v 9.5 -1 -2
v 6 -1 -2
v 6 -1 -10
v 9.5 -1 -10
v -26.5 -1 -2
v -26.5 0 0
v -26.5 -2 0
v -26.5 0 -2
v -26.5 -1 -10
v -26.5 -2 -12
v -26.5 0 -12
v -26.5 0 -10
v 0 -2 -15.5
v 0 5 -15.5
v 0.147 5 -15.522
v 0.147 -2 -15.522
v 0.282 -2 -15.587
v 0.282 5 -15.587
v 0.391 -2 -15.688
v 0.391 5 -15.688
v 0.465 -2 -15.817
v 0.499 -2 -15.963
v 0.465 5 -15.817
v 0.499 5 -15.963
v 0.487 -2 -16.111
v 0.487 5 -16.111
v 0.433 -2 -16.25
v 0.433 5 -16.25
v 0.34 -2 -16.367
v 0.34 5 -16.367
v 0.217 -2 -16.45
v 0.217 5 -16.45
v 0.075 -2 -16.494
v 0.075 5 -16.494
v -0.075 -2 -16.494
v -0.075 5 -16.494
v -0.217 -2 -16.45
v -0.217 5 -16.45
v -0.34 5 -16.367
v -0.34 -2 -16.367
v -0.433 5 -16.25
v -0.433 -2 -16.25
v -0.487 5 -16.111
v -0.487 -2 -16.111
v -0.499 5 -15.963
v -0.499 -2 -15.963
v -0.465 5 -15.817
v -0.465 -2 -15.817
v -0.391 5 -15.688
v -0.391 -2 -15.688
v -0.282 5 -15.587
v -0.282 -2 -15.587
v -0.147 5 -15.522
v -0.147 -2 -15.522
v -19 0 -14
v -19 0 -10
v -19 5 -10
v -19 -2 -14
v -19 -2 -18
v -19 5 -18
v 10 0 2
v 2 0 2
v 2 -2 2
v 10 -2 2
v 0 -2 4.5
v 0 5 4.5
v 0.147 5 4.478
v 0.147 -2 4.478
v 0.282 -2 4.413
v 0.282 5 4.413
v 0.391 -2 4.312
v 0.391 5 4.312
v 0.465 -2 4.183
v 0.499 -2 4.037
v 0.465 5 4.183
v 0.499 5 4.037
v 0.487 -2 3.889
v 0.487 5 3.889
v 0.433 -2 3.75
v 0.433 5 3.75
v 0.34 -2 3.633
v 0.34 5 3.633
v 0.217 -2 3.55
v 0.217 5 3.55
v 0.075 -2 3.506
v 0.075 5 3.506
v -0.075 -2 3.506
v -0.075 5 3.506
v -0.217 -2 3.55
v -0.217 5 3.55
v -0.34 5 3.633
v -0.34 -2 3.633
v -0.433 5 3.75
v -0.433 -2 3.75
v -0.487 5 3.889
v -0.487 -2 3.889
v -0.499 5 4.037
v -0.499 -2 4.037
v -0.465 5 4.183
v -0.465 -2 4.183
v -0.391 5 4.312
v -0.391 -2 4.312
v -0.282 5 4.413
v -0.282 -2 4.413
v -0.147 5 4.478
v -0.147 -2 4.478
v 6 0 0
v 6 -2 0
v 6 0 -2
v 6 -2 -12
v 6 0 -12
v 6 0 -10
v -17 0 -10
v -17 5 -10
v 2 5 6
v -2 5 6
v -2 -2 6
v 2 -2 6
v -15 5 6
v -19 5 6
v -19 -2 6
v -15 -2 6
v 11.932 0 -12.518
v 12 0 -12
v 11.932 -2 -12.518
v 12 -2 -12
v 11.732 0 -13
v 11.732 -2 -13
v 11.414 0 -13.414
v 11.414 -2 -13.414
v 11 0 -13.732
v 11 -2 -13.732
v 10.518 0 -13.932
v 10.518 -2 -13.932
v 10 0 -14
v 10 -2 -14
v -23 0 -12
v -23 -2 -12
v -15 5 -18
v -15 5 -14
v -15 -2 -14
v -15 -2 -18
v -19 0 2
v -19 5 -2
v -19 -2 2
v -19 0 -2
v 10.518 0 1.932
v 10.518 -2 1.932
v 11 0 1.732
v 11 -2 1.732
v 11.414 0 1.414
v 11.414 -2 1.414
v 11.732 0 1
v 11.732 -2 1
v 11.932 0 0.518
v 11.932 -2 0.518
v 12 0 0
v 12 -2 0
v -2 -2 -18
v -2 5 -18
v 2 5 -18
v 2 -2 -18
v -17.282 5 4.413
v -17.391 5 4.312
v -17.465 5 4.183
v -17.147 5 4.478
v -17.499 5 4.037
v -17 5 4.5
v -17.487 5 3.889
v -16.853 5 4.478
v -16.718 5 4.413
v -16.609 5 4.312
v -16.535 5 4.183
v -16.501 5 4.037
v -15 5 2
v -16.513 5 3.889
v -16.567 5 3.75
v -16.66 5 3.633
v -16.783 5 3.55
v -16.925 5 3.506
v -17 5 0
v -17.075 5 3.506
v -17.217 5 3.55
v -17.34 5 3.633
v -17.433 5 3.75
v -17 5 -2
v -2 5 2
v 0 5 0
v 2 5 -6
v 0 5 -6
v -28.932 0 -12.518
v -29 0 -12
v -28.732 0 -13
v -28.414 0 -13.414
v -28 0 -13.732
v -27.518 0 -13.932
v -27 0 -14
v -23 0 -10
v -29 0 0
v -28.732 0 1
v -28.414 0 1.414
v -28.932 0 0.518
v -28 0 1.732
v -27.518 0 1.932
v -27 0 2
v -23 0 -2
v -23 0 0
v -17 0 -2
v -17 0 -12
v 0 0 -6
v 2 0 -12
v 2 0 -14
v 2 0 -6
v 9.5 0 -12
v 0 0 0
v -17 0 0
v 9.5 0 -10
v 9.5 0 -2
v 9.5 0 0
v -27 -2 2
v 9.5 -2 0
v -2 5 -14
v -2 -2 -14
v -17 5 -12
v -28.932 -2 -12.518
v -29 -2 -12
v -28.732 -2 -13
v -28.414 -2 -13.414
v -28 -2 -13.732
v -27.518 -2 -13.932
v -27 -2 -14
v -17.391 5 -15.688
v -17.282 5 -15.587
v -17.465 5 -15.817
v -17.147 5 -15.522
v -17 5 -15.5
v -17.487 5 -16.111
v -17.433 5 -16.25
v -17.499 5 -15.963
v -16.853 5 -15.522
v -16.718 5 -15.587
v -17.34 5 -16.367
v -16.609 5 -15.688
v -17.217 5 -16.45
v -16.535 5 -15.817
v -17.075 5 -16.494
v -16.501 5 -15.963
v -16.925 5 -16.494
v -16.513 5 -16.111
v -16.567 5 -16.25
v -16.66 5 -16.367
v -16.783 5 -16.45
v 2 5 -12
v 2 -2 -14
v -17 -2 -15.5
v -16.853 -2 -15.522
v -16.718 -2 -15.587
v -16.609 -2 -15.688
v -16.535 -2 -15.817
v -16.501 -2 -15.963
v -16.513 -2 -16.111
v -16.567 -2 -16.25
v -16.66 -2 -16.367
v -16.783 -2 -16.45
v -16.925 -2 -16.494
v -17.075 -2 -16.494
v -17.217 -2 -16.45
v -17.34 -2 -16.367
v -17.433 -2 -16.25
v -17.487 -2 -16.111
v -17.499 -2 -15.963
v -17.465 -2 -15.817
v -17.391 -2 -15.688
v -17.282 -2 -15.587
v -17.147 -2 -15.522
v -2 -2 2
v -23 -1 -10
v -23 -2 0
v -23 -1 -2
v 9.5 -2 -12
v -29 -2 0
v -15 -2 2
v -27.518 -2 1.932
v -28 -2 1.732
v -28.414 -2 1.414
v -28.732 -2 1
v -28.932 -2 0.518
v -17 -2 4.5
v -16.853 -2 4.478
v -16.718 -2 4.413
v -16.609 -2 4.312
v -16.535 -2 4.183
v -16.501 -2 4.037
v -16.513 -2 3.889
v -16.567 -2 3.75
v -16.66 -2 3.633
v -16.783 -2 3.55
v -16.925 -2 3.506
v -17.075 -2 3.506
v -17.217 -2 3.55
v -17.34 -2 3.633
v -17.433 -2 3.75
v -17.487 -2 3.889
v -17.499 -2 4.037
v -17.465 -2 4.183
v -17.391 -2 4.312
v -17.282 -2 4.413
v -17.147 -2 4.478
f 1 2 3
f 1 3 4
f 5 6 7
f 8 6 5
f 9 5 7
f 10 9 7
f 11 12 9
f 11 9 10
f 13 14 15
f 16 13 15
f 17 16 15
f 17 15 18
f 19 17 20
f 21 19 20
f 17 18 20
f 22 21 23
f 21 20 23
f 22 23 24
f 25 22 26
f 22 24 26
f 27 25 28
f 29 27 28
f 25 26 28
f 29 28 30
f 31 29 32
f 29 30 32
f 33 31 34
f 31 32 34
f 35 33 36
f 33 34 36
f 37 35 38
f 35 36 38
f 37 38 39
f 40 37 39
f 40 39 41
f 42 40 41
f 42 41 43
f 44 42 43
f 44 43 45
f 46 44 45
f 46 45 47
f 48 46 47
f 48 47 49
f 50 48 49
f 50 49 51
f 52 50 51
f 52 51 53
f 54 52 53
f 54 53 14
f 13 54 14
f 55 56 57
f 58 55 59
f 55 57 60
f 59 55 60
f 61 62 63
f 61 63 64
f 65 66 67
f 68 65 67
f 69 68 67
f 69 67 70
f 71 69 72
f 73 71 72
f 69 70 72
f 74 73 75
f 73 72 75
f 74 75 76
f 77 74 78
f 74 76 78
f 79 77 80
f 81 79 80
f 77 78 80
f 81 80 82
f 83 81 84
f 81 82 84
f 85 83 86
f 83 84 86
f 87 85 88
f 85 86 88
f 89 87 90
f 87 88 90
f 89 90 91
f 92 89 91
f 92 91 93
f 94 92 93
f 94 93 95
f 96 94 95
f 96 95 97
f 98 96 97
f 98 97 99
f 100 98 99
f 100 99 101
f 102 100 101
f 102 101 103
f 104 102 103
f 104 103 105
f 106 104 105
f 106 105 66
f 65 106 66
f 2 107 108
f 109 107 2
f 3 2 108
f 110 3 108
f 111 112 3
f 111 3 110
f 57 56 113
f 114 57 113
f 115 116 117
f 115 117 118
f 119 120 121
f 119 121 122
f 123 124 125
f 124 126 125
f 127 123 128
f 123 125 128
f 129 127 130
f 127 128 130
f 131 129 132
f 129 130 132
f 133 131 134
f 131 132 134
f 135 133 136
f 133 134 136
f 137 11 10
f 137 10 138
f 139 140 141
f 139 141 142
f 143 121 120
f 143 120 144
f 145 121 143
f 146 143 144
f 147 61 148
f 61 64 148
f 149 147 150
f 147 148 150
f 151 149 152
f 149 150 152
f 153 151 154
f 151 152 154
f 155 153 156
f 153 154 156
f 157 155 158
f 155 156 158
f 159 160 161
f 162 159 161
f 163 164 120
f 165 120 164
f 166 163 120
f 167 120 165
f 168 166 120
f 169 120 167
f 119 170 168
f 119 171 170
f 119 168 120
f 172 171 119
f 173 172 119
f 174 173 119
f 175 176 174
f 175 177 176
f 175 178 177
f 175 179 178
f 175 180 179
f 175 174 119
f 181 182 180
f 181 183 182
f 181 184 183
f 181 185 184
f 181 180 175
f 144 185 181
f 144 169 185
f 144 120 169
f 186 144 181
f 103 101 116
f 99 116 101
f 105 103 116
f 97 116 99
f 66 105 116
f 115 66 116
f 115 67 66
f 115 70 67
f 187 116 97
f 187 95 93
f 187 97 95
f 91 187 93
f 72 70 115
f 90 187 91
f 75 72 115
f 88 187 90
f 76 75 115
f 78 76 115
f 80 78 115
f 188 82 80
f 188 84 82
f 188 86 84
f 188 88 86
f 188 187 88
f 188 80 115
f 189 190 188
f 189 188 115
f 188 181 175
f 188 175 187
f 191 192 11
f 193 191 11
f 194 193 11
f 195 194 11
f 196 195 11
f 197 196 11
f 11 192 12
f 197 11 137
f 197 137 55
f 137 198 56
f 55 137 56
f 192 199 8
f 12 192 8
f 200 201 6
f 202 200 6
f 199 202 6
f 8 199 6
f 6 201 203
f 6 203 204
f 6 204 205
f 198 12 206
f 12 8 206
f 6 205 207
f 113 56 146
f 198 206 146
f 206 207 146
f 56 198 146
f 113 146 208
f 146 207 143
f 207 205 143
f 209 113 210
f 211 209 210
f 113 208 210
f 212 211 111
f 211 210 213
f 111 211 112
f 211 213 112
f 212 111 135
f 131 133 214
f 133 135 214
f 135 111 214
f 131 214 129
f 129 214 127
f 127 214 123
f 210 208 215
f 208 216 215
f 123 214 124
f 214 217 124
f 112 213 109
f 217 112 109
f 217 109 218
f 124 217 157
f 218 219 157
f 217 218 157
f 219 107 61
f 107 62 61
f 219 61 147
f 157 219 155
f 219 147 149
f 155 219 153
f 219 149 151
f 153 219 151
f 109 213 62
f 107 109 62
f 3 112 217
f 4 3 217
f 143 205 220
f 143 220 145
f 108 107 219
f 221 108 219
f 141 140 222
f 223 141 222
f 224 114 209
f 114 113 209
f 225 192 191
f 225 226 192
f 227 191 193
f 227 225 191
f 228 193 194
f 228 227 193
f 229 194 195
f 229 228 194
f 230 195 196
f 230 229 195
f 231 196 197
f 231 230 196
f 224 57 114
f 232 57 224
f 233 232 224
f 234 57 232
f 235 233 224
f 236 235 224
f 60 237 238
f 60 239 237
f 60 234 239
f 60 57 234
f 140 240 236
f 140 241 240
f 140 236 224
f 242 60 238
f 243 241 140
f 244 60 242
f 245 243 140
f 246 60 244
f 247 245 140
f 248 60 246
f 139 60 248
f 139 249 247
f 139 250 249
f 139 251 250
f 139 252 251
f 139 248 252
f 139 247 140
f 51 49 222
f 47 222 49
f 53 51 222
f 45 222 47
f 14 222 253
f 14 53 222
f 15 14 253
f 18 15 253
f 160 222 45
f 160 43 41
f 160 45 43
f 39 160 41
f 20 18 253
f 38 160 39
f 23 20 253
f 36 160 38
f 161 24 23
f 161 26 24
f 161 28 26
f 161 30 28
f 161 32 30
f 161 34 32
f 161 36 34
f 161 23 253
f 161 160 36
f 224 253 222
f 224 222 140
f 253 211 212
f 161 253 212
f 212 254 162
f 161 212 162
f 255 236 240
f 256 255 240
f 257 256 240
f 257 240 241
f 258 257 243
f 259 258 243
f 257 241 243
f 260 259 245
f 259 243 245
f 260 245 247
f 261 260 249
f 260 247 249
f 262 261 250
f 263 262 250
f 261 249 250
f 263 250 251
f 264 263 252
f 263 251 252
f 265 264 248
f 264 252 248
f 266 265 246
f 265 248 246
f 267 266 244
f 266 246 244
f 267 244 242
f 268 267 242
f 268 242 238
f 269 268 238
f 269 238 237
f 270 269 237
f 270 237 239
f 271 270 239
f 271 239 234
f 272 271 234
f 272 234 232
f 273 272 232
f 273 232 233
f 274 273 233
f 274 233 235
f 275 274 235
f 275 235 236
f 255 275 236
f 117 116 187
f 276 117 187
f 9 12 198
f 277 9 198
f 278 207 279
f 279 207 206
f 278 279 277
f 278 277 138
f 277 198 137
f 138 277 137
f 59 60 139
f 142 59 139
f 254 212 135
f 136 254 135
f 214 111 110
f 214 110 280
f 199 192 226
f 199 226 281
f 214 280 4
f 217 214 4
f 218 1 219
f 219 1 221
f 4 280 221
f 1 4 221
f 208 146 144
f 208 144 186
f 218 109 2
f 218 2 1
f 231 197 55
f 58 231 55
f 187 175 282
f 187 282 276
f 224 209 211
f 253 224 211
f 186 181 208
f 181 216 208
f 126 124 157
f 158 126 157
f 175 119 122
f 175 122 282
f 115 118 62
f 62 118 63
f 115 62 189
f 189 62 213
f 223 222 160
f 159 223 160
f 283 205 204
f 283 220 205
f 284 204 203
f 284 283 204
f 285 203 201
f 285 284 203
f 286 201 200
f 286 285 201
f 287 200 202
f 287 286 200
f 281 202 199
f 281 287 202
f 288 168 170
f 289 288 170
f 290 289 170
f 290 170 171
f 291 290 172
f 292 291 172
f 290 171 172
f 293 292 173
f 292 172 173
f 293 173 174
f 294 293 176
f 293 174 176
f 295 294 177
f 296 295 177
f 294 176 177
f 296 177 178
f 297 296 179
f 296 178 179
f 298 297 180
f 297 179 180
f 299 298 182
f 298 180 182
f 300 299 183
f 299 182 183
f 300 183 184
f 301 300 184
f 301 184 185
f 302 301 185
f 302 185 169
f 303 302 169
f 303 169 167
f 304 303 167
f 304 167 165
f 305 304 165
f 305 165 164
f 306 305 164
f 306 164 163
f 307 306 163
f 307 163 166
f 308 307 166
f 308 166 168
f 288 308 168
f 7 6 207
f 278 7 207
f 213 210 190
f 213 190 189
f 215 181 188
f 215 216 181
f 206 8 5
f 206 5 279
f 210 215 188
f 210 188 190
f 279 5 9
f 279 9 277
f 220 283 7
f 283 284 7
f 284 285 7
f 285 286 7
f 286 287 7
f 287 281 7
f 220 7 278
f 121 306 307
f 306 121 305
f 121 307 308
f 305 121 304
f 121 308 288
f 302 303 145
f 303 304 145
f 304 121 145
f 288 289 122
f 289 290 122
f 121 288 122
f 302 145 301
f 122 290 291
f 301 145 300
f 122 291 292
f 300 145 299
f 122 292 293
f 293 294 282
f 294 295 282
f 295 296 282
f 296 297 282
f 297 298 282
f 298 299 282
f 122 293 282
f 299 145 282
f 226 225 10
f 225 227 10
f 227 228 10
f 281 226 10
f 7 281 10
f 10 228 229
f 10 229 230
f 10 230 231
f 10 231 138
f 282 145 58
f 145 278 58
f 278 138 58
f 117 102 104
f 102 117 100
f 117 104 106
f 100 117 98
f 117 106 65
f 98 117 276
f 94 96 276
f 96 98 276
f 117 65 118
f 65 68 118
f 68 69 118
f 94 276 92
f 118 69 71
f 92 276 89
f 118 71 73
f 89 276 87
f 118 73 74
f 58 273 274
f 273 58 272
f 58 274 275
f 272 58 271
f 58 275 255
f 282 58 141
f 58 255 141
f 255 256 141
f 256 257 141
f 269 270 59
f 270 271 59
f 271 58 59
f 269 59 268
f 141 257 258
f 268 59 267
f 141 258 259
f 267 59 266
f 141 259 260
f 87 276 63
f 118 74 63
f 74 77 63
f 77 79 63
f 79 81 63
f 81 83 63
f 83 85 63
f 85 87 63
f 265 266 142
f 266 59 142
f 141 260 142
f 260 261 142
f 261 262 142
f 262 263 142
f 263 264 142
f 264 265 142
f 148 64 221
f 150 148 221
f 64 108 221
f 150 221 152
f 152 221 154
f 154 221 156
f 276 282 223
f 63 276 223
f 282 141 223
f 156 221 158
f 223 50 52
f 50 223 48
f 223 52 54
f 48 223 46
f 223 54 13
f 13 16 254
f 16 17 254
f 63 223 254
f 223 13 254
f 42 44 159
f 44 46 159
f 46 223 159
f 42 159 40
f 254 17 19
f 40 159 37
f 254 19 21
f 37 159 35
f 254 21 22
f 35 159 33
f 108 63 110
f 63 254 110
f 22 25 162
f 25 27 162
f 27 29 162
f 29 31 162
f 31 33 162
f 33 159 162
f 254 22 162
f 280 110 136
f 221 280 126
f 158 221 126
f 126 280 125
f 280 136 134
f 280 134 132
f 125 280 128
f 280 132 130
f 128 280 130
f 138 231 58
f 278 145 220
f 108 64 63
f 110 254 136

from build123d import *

# Parameters (mm, degrees)
SKETCH1_W           = 21
SKETCH1_H           = 16
SKETCH1_W_2         = 17
SKETCH1_H_2         = 12
BOSS_EXTRUDE1_DEPTH = 2
SKETCH1_6_W         = 21
SKETCH1_6_H         = 16
SKETCH1_6_W_2       = 17
SKETCH1_6_H_2       = 12
BOSS_EXTRUDE2_DEPTH = 7
SKETCH2_W           = 41
SKETCH2_H           = 16
BOSS_EXTRUDE3_DEPTH = 2
SKETCH3_W           = 3.5
SKETCH3_H           = 2
CUT_EXTRUDE1_DEPTH  = 33.954514107
SKETCH4_W           = 3.5
SKETCH4_H           = 8
CUT_EXTRUDE2_DEPTH  = 1
CUT_EXTRUDE3_START  = -7
SKETCH5_W           = 2
SKETCH5_H           = 8
SKETCH5_H_2         = 6
CUT_EXTRUDE3_DEPTH  = 7
CUT_EXTRUDE4_DEPTH  = 2
CUT_EXTRUDE5_DEPTH  = 2
SKETCH9_W           = 4
SKETCH9_H           = 4
BOSS_EXTRUDE4_DEPTH = 7
SKETCH10_R          = 0.5
CUT_EXTRUDE6_DEPTH  = 35.84250278
SKETCH11_W          = 3.5
SKETCH11_H          = 8
CUT_EXTRUDE7_DEPTH  = 1
FILLET1_R           = 2


with BuildPart() as part:
    # Sketch1 → Boss-Extrude1 (new body)
    # profile 1 of 2: a face of its own
    with BuildSketch(Plane(origin=(0, 0, 0), x_dir=(1, 0, 0), z_dir=(0, 1, 0))):
        with Locations((-8.5, 6)):
            Rectangle(SKETCH1_W, SKETCH1_H)
        with Locations((-8.5, 6)):
            Rectangle(SKETCH1_W_2, SKETCH1_H_2, mode=Mode.SUBTRACT)
    # profile 2 of 2: a face of its own
    with BuildSketch(Plane(origin=(0, 0, 0), x_dir=(1, 0, 0), z_dir=(0, 1, 0))):
        with Locations((-8.5, 6)):
            Rectangle(SKETCH1_W_2, SKETCH1_H_2)
    extrude(amount=BOSS_EXTRUDE1_DEPTH)

    # Sketch1<6> → Boss-Extrude2 (add)
    with BuildSketch(Plane(origin=(0, 0, 0), x_dir=(1, 0, 0), z_dir=(0, 1, 0))):
        with Locations((-8.5, 6)):
            Rectangle(SKETCH1_6_W, SKETCH1_6_H)
        with Locations((-8.5, 6)):
            Rectangle(SKETCH1_6_W_2, SKETCH1_6_H_2, mode=Mode.SUBTRACT)
    extrude(amount=BOSS_EXTRUDE2_DEPTH)

    # Sketch2 → Boss-Extrude3 (add)
    with BuildSketch(Plane.XZ):
        with Locations((-8.5, -6)):
            Rectangle(SKETCH2_W, SKETCH2_H)
    extrude(amount=BOSS_EXTRUDE3_DEPTH)

    # Sketch3 → Cut-Extrude1 (cut, through all)
    with BuildSketch(Plane(origin=(0, 0, 0), x_dir=(1, 0, 0), z_dir=(0, 1, 0))):
        with Locations((-24.75, 11)):
            Rectangle(SKETCH3_W, SKETCH3_H)
        with Locations((-24.75, 1)):
            Rectangle(SKETCH3_W, SKETCH3_H)
        with Locations((7.75, 11)):
            Rectangle(SKETCH3_W, SKETCH3_H)
        with Locations((7.75, 1)):
            Rectangle(SKETCH3_W, SKETCH3_H)
    extrude(amount=-CUT_EXTRUDE1_DEPTH, mode=Mode.SUBTRACT)

    # Sketch4 → Cut-Extrude2 (cut)
    with BuildSketch(Plane.XZ.offset(2)):
        with Locations((-24.75, -6)):
            Rectangle(SKETCH4_W, SKETCH4_H)
    extrude(amount=-CUT_EXTRUDE2_DEPTH, mode=Mode.SUBTRACT)

    # Sketch5 → Cut-Extrude3 (cut)
    with BuildSketch(Plane(origin=(0, 7, 0), x_dir=(1, 0, 0), z_dir=(0, 1, 0)).offset(CUT_EXTRUDE3_START)):
        with Locations((-18, 6)):
            Rectangle(SKETCH5_W, SKETCH5_H)
        with Locations((1, 9)):
            Rectangle(SKETCH5_W, SKETCH5_H_2)
    extrude(amount=CUT_EXTRUDE3_DEPTH, mode=Mode.SUBTRACT)

    # Sketch7 → Cut-Extrude4 (cut)
    with BuildSketch(Plane(origin=(0, 2, 0), x_dir=(1, 0, 0), z_dir=(0, 1, 0))):
        Polygon((-17, 2), (-17, 0), (0, 0), (0, 6), (0, 12), (-17, 12), (-17, 10), align=None)
    extrude(amount=-CUT_EXTRUDE4_DEPTH, mode=Mode.SUBTRACT)

    # Sketch8 → Cut-Extrude5 (cut)
    with BuildSketch(Plane(origin=(0, 7, 0), x_dir=(1, 0, 0), z_dir=(0, 1, 0))):
        Polygon((-17, 2), (-19, 2), (-19, -2), (2, -2), (2, 6), (0, 6), (0, 0), (-17, 0), align=None)
        Polygon((-19, 10), (-17, 10), (-17, 12), (2, 12), (2, 14), (-19, 14), align=None)
    extrude(amount=-CUT_EXTRUDE5_DEPTH, mode=Mode.SUBTRACT)

    # Sketch9 → Boss-Extrude4 (add)
    with BuildSketch(Plane(origin=(0, 5, 0), x_dir=(1, 0, 0), z_dir=(0, 1, 0))):
        with Locations((-17, 16)):
            Rectangle(SKETCH9_W, SKETCH9_H)
        with Locations((0, 16)):
            Rectangle(SKETCH9_W, SKETCH9_H)
        with Locations((0, -4)):
            Rectangle(SKETCH9_W, SKETCH9_H)
        with Locations((-17, -4)):
            Rectangle(SKETCH9_W, SKETCH9_H)
    extrude(amount=-BOSS_EXTRUDE4_DEPTH)

    # Sketch10 → Cut-Extrude6 (cut, through all)
    with BuildSketch(Plane(origin=(0, 5, 0), x_dir=(1, 0, 0), z_dir=(0, 1, 0))):
        with Locations(Location((-17, 16, 0), (0, 0, 270))):
            Circle(SKETCH10_R)
        with Locations(Location((0, 16, 0), (0, 0, 270))):
            Circle(SKETCH10_R)
        with Locations(Location((0, -4, 0), (0, 0, 270))):
            Circle(SKETCH10_R)
        with Locations(Location((-17, -4, 0), (0, 0, 270))):
            Circle(SKETCH10_R)
    extrude(amount=-CUT_EXTRUDE6_DEPTH, mode=Mode.SUBTRACT)

    # Sketch11 → Cut-Extrude7 (cut)
    with BuildSketch(Plane.XZ.offset(2)):
        with Locations((7.75, -6)):
            Rectangle(SKETCH11_W, SKETCH11_H)
    extrude(amount=-CUT_EXTRUDE7_DEPTH, mode=Mode.SUBTRACT)

    # Fillet1
    fillet1_edges = [part.edges().sort_by_distance(p)[0] for p in [
        (-29, -1, 2),
        (-29, -1, -14),
        (12, -1, -14),
        (12, -1, 2),
    ]]
    fillet(fillet1_edges, radius=FILLET1_R)


solid = part.part
